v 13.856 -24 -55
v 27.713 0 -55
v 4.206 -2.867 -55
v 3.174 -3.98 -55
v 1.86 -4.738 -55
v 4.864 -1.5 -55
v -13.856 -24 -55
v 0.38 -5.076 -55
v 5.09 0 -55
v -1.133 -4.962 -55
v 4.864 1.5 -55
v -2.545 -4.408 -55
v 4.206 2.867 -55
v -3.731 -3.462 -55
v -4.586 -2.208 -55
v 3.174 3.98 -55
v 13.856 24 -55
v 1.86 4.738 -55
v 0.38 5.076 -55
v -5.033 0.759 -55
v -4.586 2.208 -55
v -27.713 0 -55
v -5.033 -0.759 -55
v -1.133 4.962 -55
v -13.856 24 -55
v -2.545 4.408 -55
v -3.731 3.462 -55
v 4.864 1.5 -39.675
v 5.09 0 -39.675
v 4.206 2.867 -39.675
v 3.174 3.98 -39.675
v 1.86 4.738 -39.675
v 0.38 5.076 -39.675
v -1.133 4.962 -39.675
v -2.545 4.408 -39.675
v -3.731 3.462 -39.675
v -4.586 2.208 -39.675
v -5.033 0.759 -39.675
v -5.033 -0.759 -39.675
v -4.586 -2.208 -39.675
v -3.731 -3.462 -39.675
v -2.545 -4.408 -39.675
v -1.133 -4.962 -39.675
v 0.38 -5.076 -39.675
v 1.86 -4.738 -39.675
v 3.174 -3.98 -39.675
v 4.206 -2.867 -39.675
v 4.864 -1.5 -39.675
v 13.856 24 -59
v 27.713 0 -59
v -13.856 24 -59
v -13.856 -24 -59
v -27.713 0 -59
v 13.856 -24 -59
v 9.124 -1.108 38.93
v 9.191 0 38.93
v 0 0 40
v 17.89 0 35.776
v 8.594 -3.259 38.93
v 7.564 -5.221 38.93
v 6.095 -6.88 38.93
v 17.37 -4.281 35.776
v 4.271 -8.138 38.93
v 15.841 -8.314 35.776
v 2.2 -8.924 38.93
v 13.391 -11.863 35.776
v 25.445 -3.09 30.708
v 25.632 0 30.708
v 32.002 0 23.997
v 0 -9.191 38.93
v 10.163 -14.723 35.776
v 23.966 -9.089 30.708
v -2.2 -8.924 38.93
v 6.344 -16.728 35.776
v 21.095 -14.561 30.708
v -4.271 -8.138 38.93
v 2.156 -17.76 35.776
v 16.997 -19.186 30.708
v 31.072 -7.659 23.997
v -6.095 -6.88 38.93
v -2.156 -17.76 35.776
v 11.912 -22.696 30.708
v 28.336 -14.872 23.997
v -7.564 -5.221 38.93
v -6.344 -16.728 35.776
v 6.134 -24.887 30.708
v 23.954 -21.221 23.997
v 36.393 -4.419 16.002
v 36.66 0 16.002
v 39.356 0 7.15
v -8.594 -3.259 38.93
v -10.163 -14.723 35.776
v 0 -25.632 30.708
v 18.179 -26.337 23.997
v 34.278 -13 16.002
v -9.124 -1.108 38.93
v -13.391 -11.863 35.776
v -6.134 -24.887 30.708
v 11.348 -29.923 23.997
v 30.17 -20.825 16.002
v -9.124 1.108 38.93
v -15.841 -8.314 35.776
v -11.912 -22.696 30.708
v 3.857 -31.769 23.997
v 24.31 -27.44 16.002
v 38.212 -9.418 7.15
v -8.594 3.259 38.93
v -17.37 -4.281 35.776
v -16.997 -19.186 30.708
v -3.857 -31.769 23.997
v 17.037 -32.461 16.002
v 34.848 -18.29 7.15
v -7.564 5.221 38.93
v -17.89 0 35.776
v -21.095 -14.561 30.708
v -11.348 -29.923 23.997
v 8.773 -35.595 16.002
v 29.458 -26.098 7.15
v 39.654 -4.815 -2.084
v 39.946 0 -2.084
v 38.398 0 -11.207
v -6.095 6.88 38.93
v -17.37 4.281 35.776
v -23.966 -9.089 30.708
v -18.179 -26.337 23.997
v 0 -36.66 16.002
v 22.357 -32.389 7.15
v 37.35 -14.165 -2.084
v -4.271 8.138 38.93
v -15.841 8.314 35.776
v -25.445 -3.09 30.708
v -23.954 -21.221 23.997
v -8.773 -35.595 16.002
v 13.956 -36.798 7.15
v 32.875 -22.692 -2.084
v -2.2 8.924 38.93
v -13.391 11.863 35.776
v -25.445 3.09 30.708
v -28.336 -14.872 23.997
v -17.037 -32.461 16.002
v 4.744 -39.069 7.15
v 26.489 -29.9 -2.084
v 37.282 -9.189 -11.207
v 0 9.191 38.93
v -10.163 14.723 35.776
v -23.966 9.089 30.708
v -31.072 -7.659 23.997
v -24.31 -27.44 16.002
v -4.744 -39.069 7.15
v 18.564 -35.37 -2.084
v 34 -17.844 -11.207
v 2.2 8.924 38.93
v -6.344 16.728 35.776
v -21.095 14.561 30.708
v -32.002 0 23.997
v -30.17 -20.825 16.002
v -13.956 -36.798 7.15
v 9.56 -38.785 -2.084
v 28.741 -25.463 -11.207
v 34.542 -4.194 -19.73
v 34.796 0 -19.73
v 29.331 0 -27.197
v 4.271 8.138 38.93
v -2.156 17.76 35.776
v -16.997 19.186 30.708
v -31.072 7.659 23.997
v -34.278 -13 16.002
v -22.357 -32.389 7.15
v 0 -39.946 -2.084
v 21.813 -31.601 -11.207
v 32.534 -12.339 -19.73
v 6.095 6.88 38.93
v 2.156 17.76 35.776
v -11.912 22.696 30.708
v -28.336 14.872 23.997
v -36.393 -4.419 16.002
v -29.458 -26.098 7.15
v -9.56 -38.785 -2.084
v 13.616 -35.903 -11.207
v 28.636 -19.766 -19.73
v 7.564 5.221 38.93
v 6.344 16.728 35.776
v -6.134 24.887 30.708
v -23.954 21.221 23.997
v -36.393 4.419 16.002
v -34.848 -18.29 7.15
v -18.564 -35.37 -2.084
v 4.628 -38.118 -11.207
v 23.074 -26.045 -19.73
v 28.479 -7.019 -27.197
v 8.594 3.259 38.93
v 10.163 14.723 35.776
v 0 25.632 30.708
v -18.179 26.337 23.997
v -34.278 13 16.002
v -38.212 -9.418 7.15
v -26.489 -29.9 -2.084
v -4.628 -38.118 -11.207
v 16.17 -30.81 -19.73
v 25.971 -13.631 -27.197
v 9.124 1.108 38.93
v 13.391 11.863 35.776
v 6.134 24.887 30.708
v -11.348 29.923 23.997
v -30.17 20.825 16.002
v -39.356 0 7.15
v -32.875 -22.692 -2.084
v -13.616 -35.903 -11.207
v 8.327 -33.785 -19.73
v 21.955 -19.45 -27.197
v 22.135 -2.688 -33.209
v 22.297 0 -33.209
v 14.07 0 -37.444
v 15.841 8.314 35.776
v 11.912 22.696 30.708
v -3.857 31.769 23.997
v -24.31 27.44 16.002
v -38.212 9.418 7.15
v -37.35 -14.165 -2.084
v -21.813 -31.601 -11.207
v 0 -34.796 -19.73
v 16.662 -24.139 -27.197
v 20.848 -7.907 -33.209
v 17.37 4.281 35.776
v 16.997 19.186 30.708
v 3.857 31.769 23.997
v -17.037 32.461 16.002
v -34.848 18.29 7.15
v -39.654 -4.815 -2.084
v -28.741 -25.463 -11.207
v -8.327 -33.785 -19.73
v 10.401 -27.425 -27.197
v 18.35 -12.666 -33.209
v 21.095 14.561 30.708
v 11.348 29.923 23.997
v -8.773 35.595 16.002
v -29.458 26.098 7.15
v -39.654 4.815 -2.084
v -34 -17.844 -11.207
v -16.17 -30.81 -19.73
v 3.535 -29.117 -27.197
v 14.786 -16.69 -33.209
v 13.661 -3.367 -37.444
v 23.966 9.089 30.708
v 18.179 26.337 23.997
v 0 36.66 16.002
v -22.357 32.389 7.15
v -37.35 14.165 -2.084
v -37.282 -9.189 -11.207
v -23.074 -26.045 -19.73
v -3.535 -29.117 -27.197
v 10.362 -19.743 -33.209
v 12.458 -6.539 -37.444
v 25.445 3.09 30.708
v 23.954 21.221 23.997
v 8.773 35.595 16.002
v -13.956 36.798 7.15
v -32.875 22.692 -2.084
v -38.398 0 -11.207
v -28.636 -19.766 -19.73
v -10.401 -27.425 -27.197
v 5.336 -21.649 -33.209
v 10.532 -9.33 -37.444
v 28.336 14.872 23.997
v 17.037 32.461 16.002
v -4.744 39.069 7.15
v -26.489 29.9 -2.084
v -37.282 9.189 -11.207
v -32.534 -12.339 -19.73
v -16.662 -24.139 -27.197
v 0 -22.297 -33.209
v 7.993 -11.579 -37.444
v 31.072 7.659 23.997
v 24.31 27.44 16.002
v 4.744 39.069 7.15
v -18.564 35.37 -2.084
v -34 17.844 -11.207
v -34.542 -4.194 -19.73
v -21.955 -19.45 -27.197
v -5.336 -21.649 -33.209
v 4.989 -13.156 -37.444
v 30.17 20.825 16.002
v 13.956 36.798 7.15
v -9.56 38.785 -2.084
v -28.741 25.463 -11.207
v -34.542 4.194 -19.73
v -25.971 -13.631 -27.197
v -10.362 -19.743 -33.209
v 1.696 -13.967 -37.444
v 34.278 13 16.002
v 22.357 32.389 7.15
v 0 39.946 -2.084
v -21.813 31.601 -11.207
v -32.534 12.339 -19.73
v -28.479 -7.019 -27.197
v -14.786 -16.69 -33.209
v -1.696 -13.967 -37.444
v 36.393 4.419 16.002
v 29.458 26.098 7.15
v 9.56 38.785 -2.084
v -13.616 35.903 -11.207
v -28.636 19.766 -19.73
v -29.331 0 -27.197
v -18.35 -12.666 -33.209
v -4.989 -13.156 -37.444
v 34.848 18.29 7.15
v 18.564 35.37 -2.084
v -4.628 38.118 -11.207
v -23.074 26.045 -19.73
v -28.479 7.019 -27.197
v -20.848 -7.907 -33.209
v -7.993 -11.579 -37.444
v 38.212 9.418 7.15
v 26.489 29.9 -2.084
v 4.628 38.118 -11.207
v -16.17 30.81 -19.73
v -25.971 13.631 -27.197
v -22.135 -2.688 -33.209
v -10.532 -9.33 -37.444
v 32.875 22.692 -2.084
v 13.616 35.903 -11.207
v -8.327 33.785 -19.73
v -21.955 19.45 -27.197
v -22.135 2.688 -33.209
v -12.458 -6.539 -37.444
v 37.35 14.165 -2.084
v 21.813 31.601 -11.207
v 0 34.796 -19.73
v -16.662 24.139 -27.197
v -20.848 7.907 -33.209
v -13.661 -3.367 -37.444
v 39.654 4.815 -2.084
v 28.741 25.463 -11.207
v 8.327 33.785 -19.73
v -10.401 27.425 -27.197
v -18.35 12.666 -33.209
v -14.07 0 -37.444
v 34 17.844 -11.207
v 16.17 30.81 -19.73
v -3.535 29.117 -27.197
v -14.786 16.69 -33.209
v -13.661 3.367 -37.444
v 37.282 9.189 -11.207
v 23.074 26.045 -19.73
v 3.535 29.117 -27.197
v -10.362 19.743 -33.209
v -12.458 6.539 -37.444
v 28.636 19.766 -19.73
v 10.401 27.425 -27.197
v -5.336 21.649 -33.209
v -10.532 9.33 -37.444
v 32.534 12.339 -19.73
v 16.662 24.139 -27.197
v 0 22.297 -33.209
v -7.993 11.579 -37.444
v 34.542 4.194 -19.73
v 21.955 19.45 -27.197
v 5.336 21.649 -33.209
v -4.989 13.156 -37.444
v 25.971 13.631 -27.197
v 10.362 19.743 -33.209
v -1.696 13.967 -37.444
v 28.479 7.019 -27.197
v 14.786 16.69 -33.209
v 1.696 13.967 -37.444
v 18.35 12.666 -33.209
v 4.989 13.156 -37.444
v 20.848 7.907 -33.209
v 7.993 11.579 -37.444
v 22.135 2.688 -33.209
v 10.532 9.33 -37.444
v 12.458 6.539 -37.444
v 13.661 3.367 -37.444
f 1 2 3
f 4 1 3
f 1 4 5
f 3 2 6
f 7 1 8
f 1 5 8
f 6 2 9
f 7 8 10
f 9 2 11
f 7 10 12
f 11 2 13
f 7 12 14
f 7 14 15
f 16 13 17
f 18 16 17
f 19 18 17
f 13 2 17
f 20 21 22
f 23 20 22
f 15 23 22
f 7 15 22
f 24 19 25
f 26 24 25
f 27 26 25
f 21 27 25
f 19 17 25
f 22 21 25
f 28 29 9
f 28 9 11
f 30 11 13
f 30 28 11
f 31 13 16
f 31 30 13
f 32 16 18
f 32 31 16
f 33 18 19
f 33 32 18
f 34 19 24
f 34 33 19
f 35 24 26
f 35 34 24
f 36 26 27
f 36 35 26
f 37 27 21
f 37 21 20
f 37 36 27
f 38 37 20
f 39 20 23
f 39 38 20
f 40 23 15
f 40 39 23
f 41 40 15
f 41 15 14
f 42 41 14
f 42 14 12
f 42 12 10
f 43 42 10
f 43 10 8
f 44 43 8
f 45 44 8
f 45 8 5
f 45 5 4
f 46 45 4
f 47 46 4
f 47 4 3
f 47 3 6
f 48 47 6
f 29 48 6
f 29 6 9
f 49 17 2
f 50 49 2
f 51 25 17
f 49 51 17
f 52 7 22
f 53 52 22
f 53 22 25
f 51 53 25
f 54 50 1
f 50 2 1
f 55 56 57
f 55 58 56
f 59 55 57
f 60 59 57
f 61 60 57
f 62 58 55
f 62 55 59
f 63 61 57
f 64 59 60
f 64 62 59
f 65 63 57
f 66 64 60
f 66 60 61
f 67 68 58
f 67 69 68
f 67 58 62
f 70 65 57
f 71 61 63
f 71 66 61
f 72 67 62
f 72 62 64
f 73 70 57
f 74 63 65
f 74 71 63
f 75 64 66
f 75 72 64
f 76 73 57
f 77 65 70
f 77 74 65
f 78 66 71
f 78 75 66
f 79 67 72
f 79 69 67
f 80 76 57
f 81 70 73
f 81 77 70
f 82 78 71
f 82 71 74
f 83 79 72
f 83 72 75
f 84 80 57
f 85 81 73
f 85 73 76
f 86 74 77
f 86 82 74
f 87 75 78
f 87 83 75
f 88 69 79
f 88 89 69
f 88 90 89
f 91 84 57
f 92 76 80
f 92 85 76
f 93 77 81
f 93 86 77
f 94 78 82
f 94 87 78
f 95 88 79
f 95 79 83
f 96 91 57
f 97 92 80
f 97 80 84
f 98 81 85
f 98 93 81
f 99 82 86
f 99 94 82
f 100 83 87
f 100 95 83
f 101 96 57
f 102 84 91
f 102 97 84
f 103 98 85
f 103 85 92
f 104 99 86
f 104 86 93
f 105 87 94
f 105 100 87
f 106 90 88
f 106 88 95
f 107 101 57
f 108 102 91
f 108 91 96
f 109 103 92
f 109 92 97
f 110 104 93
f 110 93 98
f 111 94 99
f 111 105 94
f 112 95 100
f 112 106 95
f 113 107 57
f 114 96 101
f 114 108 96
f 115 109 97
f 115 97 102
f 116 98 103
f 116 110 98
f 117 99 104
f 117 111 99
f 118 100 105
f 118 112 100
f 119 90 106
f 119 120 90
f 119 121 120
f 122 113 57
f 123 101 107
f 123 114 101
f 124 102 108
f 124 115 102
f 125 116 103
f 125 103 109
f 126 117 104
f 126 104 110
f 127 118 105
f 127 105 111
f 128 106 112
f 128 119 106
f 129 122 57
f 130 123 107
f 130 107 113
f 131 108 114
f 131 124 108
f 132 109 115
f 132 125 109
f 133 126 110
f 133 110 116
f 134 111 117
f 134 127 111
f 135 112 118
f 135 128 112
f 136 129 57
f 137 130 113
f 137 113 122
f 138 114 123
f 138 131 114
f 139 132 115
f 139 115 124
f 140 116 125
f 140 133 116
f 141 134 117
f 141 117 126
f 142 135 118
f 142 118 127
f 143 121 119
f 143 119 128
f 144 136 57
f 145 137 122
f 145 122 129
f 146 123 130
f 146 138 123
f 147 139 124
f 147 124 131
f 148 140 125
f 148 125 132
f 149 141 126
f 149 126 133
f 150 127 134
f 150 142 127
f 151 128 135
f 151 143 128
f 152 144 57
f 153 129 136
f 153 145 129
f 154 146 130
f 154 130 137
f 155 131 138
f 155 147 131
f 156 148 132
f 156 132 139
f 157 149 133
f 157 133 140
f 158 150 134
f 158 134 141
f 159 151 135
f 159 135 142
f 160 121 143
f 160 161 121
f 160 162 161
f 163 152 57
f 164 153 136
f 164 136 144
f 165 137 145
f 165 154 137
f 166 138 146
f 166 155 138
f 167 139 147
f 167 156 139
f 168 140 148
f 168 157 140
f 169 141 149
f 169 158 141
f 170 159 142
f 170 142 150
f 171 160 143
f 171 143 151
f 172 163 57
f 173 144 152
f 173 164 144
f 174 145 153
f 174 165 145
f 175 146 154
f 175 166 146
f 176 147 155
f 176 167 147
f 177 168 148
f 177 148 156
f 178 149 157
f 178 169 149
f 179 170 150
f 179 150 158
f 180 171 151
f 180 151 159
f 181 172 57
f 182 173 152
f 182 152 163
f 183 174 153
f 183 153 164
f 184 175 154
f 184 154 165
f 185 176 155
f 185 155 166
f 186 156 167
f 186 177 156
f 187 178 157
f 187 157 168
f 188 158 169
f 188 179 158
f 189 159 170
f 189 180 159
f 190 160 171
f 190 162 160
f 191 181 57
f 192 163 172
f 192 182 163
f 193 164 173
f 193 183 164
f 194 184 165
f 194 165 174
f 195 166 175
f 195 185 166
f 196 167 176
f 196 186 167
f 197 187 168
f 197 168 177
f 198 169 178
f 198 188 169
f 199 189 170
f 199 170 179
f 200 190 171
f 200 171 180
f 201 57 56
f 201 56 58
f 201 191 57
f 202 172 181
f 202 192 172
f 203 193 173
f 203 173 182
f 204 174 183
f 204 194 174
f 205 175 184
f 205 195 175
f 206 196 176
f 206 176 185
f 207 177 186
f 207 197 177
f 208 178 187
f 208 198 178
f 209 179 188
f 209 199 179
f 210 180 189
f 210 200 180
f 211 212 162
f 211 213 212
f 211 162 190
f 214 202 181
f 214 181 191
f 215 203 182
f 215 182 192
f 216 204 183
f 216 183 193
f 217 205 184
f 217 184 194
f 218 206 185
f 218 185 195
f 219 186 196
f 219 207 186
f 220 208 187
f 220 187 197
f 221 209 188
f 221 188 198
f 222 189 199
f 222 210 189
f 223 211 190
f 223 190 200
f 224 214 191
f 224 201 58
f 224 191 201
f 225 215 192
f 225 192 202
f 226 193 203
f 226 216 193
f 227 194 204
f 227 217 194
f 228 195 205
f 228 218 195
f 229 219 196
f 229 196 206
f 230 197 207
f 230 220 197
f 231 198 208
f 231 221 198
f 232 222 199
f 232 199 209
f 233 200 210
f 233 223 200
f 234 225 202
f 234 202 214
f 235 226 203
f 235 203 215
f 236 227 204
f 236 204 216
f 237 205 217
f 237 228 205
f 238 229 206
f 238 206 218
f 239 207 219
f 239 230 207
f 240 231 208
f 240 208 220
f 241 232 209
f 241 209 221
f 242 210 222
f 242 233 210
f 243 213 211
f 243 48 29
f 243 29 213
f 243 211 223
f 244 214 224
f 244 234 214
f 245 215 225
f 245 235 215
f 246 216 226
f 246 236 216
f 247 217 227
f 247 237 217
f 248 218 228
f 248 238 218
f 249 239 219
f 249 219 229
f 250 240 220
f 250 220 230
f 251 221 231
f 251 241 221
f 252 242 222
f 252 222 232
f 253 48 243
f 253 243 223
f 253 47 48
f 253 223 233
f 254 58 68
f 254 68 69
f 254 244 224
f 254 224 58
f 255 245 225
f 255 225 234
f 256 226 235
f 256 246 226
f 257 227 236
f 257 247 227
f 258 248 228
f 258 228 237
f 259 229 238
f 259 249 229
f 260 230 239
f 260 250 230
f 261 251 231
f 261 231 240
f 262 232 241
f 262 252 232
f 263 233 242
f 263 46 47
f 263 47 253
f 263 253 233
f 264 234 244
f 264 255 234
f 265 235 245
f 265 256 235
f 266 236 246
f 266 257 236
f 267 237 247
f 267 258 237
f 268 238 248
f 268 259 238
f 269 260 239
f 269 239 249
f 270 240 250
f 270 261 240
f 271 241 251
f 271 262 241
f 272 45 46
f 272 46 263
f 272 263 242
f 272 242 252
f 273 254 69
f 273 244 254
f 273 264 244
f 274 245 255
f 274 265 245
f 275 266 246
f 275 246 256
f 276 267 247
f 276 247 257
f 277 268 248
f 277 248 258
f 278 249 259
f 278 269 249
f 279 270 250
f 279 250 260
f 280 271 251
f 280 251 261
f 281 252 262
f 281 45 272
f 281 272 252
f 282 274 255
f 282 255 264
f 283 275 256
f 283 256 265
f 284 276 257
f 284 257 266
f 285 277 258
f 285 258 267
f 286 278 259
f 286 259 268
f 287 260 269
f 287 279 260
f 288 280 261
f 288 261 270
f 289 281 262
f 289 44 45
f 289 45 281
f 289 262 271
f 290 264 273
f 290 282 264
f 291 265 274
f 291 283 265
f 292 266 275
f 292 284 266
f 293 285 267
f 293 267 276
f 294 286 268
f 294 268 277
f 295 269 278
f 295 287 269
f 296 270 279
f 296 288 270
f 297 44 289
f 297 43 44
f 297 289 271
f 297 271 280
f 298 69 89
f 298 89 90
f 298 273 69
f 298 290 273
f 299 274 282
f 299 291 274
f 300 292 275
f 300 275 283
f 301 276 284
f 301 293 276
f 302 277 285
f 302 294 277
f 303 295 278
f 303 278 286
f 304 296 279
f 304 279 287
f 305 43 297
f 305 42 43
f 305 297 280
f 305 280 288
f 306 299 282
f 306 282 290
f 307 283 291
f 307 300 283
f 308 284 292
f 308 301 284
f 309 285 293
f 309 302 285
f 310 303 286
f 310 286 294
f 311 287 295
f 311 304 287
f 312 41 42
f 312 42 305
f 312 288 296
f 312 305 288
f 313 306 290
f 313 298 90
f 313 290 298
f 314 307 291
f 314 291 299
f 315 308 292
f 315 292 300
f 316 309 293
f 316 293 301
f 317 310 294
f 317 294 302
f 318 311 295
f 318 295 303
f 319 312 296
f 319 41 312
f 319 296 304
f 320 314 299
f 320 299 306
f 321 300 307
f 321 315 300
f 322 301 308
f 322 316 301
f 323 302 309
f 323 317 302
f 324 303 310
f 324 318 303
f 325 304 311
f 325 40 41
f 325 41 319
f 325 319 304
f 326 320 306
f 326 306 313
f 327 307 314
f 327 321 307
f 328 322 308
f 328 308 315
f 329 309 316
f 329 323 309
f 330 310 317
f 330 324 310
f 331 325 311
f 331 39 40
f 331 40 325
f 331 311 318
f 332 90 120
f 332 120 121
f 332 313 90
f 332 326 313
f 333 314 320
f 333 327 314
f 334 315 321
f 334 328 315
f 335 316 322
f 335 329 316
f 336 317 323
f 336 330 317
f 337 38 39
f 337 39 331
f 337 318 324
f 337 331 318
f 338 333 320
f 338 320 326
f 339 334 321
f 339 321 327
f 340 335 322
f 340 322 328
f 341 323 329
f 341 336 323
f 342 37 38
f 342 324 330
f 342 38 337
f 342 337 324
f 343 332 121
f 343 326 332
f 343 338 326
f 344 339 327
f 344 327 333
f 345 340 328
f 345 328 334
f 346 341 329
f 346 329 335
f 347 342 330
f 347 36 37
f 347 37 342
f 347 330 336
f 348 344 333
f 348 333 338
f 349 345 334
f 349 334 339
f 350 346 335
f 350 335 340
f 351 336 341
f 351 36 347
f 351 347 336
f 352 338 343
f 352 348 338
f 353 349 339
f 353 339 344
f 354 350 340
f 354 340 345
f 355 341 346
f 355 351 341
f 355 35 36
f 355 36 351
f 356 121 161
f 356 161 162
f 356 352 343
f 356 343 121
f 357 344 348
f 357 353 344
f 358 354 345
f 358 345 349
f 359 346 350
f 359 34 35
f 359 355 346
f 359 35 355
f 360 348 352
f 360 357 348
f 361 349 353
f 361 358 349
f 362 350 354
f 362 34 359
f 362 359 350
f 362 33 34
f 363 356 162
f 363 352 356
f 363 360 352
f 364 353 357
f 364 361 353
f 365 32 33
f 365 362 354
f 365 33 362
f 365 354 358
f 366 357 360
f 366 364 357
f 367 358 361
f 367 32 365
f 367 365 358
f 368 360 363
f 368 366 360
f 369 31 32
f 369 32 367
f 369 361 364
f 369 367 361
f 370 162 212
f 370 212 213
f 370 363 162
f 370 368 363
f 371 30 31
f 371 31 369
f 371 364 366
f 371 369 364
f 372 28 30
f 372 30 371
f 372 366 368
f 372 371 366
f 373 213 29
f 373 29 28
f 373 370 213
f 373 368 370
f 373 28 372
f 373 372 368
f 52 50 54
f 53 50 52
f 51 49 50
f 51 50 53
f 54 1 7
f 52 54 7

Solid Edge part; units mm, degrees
sketch "Sketch1" plane through (0, 0, 0) normal (0, -1, 0) x (1, 0, 0)
  line L0 (0, 40) -> (0, -40)
  arc A0 (0, 40) -> (0, -40) centre (0, 0) cw
revolve "RevolvedProtrusion1" add sketch "Sketch1" angle 360 about axis through (0, 0, 45) along (0, 0, -1)
sketch "Sketch2" plane through (0, 0, 0) normal (0, 0, 1) x (1, 0, 0)
  circle A0 centre (0, 0) radius 5.09
extrude "Protrusion1" add sketch "Sketch2" against normal blind 55
sketch "Sketch3" plane through (0, 0, -55) normal (0, 0, -1) x (1, 0, 0)
  line L0 (27.7128, 0) -> (13.8564, 24)
  line L1 (13.8564, 24) -> (-13.8564, 24)
  line L2 (-13.8564, 24) -> (-27.7128, 0)
  line L3 (-27.7128, 0) -> (-13.8564, -24)
  line L4 (-13.8564, -24) -> (13.8564, -24)
  line L5 (13.8564, -24) -> (27.7128, 0)
extrude "ExtrudedProtrusion_2" add sketch "Sketch3" along normal blind 4
